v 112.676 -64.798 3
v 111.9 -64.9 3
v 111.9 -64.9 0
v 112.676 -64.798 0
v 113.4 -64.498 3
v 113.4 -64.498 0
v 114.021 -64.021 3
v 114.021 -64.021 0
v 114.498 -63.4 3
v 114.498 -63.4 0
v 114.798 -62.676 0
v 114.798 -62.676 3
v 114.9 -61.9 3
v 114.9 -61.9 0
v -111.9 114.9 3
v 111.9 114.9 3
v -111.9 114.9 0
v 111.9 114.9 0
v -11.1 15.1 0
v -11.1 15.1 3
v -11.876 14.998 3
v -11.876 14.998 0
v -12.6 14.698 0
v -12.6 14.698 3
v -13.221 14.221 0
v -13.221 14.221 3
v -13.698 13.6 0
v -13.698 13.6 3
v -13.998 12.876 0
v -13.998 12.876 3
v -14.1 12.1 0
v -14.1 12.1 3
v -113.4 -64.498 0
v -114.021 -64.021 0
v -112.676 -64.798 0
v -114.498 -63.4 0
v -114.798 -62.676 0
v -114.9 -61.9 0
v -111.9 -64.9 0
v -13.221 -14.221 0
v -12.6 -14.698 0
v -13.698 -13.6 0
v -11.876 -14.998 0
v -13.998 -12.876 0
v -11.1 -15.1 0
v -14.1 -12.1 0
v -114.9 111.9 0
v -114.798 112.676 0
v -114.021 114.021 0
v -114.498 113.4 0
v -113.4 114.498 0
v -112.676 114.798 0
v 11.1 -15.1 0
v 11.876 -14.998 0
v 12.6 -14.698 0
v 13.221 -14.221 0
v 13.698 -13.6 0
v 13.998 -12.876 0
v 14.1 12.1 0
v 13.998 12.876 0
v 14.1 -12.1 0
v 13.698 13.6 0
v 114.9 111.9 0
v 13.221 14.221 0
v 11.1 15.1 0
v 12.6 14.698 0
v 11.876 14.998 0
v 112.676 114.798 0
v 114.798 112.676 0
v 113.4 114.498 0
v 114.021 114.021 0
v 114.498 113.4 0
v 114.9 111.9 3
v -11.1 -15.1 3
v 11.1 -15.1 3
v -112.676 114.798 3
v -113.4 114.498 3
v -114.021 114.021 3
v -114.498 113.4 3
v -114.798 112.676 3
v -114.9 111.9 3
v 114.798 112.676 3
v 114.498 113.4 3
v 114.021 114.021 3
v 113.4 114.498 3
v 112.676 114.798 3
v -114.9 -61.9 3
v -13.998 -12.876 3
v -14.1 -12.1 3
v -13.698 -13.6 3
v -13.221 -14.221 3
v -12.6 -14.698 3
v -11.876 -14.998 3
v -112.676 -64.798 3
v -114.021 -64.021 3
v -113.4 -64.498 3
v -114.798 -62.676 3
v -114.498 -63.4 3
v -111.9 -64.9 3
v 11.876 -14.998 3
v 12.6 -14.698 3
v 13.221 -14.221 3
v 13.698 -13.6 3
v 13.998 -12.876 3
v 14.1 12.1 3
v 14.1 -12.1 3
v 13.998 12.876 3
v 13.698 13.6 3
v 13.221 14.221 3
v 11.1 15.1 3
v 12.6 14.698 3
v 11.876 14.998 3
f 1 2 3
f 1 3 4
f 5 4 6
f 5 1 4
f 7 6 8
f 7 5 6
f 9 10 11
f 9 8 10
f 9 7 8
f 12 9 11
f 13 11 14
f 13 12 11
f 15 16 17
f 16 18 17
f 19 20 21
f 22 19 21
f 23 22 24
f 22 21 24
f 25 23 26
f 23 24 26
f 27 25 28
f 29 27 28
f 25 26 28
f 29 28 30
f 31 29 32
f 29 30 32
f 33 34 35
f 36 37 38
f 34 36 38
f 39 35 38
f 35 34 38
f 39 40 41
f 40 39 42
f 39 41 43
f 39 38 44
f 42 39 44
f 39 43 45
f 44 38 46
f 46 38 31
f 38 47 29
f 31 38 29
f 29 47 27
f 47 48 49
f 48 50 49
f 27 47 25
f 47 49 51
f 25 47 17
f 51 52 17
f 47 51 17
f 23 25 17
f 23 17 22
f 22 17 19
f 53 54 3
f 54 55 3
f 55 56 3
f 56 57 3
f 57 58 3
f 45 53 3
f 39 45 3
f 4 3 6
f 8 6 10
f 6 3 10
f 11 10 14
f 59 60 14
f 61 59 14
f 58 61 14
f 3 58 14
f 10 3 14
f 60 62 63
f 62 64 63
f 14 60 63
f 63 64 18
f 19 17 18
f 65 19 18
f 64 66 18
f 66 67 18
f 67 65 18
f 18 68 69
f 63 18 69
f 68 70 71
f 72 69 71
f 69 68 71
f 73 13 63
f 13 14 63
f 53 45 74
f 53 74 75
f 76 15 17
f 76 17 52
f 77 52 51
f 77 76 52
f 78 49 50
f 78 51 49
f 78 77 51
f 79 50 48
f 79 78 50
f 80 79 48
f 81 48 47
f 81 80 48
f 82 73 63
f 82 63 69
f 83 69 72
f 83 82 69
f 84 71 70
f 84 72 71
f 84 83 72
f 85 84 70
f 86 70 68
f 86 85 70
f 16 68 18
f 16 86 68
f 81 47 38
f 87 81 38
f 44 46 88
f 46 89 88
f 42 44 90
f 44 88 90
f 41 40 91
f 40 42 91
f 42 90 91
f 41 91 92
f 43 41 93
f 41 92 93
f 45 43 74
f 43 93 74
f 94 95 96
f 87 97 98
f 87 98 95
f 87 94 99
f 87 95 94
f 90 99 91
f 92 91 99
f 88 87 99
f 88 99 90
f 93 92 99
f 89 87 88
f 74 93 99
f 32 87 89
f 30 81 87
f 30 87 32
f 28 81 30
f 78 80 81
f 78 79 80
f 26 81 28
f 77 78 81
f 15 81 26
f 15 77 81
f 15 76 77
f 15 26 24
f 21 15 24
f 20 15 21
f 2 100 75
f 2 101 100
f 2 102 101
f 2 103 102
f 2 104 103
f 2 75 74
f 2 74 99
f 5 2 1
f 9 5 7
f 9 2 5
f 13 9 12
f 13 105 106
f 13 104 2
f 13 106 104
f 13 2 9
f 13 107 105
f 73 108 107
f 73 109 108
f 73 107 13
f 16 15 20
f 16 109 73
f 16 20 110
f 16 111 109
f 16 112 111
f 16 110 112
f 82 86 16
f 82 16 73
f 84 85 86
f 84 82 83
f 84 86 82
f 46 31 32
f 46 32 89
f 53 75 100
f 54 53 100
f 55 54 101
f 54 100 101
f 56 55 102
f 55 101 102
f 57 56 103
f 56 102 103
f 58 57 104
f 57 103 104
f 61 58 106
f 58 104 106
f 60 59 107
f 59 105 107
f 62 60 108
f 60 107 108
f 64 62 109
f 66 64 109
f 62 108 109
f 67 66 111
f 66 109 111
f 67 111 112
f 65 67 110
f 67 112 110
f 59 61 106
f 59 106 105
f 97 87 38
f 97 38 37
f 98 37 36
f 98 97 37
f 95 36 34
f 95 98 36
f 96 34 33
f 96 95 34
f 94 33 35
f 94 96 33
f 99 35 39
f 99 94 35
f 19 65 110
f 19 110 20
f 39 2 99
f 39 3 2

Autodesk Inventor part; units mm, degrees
ref_plane "YZ Plane" through (0, 0, 0) normal (1, 0, 0) x (0, 1, 0)
ref_plane "XZ Plane" through (0, 0, 0) normal (0, 1, 0) x (-1, 0, 0)
ref_plane "XY Plane" through (0, 0, 0) normal (0, 0, 1) x (1, 0, 0)
sketch "Sketch1" plane through (0, 0, 0) normal (0, 0, 1) x (1, 0, 0)
  line L0 (-14.1, -15.1) -> (14.1, -15.1)
  line L1 (14.1, -15.1) -> (14.1, 15.1)
  line L2 (14.1, 15.1) -> (-14.1, 15.1)
  line L3 (-14.1, 15.1) -> (-14.1, -15.1)
  line L4 (-14.1, -15.1) -> (14.1, 15.1) construction
  line L5 (14.1, -15.1) -> (-14.1, 15.1) construction
  line L6 (-114.9, -114.9) -> (114.9, -114.9)
  line L7 (114.9, -114.9) -> (114.9, 114.9)
  line L8 (114.9, 114.9) -> (-114.9, 114.9)
  line L9 (-114.9, 114.9) -> (-114.9, -114.9)
  line L10 (-114.9, -114.9) -> (114.9, 114.9) construction
  line L11 (114.9, -114.9) -> (-114.9, 114.9) construction
  line L12 (-114.9, -114.9) -> (114.9, -114.9)
  line L13 (114.9, -114.9) -> (114.9, -64.9)
  line L14 (114.9, -64.9) -> (-114.9, -64.9)
  line L15 (-114.9, -64.9) -> (-114.9, -114.9)
  point P0 (0, 0)
  point P1 (-114.9, -64.9)
  dimension "d0" = 28.2
  dimension "d1" = 30.2
  dimension "d2" = 229.8
  dimension "d3" = 229.8
  dimension "d4" = 179.8
  dimension "d9" = 64.9
  dimension "d10" = 114.9
extrude "Extrusion1" add sketch "Sketch1" along normal blind 3 contours L9 L8 L7 L14
fillet "Fillet1" radius 3 4 edges at (-14.1, -15.1, 1.5) (-14.1, 15.1, 1.5) (14.1, 15.1, 1.5) (14.1, -15.1, 1.5)
fillet "Fillet2" radius 3 4 edges at (114.9, 114.9, 1.5) (114.9, -64.9, 1.5) (-114.9, -64.9, 1.5) (-114.9, 114.9, 1.5)
properties part number "ChamberCamSide"
